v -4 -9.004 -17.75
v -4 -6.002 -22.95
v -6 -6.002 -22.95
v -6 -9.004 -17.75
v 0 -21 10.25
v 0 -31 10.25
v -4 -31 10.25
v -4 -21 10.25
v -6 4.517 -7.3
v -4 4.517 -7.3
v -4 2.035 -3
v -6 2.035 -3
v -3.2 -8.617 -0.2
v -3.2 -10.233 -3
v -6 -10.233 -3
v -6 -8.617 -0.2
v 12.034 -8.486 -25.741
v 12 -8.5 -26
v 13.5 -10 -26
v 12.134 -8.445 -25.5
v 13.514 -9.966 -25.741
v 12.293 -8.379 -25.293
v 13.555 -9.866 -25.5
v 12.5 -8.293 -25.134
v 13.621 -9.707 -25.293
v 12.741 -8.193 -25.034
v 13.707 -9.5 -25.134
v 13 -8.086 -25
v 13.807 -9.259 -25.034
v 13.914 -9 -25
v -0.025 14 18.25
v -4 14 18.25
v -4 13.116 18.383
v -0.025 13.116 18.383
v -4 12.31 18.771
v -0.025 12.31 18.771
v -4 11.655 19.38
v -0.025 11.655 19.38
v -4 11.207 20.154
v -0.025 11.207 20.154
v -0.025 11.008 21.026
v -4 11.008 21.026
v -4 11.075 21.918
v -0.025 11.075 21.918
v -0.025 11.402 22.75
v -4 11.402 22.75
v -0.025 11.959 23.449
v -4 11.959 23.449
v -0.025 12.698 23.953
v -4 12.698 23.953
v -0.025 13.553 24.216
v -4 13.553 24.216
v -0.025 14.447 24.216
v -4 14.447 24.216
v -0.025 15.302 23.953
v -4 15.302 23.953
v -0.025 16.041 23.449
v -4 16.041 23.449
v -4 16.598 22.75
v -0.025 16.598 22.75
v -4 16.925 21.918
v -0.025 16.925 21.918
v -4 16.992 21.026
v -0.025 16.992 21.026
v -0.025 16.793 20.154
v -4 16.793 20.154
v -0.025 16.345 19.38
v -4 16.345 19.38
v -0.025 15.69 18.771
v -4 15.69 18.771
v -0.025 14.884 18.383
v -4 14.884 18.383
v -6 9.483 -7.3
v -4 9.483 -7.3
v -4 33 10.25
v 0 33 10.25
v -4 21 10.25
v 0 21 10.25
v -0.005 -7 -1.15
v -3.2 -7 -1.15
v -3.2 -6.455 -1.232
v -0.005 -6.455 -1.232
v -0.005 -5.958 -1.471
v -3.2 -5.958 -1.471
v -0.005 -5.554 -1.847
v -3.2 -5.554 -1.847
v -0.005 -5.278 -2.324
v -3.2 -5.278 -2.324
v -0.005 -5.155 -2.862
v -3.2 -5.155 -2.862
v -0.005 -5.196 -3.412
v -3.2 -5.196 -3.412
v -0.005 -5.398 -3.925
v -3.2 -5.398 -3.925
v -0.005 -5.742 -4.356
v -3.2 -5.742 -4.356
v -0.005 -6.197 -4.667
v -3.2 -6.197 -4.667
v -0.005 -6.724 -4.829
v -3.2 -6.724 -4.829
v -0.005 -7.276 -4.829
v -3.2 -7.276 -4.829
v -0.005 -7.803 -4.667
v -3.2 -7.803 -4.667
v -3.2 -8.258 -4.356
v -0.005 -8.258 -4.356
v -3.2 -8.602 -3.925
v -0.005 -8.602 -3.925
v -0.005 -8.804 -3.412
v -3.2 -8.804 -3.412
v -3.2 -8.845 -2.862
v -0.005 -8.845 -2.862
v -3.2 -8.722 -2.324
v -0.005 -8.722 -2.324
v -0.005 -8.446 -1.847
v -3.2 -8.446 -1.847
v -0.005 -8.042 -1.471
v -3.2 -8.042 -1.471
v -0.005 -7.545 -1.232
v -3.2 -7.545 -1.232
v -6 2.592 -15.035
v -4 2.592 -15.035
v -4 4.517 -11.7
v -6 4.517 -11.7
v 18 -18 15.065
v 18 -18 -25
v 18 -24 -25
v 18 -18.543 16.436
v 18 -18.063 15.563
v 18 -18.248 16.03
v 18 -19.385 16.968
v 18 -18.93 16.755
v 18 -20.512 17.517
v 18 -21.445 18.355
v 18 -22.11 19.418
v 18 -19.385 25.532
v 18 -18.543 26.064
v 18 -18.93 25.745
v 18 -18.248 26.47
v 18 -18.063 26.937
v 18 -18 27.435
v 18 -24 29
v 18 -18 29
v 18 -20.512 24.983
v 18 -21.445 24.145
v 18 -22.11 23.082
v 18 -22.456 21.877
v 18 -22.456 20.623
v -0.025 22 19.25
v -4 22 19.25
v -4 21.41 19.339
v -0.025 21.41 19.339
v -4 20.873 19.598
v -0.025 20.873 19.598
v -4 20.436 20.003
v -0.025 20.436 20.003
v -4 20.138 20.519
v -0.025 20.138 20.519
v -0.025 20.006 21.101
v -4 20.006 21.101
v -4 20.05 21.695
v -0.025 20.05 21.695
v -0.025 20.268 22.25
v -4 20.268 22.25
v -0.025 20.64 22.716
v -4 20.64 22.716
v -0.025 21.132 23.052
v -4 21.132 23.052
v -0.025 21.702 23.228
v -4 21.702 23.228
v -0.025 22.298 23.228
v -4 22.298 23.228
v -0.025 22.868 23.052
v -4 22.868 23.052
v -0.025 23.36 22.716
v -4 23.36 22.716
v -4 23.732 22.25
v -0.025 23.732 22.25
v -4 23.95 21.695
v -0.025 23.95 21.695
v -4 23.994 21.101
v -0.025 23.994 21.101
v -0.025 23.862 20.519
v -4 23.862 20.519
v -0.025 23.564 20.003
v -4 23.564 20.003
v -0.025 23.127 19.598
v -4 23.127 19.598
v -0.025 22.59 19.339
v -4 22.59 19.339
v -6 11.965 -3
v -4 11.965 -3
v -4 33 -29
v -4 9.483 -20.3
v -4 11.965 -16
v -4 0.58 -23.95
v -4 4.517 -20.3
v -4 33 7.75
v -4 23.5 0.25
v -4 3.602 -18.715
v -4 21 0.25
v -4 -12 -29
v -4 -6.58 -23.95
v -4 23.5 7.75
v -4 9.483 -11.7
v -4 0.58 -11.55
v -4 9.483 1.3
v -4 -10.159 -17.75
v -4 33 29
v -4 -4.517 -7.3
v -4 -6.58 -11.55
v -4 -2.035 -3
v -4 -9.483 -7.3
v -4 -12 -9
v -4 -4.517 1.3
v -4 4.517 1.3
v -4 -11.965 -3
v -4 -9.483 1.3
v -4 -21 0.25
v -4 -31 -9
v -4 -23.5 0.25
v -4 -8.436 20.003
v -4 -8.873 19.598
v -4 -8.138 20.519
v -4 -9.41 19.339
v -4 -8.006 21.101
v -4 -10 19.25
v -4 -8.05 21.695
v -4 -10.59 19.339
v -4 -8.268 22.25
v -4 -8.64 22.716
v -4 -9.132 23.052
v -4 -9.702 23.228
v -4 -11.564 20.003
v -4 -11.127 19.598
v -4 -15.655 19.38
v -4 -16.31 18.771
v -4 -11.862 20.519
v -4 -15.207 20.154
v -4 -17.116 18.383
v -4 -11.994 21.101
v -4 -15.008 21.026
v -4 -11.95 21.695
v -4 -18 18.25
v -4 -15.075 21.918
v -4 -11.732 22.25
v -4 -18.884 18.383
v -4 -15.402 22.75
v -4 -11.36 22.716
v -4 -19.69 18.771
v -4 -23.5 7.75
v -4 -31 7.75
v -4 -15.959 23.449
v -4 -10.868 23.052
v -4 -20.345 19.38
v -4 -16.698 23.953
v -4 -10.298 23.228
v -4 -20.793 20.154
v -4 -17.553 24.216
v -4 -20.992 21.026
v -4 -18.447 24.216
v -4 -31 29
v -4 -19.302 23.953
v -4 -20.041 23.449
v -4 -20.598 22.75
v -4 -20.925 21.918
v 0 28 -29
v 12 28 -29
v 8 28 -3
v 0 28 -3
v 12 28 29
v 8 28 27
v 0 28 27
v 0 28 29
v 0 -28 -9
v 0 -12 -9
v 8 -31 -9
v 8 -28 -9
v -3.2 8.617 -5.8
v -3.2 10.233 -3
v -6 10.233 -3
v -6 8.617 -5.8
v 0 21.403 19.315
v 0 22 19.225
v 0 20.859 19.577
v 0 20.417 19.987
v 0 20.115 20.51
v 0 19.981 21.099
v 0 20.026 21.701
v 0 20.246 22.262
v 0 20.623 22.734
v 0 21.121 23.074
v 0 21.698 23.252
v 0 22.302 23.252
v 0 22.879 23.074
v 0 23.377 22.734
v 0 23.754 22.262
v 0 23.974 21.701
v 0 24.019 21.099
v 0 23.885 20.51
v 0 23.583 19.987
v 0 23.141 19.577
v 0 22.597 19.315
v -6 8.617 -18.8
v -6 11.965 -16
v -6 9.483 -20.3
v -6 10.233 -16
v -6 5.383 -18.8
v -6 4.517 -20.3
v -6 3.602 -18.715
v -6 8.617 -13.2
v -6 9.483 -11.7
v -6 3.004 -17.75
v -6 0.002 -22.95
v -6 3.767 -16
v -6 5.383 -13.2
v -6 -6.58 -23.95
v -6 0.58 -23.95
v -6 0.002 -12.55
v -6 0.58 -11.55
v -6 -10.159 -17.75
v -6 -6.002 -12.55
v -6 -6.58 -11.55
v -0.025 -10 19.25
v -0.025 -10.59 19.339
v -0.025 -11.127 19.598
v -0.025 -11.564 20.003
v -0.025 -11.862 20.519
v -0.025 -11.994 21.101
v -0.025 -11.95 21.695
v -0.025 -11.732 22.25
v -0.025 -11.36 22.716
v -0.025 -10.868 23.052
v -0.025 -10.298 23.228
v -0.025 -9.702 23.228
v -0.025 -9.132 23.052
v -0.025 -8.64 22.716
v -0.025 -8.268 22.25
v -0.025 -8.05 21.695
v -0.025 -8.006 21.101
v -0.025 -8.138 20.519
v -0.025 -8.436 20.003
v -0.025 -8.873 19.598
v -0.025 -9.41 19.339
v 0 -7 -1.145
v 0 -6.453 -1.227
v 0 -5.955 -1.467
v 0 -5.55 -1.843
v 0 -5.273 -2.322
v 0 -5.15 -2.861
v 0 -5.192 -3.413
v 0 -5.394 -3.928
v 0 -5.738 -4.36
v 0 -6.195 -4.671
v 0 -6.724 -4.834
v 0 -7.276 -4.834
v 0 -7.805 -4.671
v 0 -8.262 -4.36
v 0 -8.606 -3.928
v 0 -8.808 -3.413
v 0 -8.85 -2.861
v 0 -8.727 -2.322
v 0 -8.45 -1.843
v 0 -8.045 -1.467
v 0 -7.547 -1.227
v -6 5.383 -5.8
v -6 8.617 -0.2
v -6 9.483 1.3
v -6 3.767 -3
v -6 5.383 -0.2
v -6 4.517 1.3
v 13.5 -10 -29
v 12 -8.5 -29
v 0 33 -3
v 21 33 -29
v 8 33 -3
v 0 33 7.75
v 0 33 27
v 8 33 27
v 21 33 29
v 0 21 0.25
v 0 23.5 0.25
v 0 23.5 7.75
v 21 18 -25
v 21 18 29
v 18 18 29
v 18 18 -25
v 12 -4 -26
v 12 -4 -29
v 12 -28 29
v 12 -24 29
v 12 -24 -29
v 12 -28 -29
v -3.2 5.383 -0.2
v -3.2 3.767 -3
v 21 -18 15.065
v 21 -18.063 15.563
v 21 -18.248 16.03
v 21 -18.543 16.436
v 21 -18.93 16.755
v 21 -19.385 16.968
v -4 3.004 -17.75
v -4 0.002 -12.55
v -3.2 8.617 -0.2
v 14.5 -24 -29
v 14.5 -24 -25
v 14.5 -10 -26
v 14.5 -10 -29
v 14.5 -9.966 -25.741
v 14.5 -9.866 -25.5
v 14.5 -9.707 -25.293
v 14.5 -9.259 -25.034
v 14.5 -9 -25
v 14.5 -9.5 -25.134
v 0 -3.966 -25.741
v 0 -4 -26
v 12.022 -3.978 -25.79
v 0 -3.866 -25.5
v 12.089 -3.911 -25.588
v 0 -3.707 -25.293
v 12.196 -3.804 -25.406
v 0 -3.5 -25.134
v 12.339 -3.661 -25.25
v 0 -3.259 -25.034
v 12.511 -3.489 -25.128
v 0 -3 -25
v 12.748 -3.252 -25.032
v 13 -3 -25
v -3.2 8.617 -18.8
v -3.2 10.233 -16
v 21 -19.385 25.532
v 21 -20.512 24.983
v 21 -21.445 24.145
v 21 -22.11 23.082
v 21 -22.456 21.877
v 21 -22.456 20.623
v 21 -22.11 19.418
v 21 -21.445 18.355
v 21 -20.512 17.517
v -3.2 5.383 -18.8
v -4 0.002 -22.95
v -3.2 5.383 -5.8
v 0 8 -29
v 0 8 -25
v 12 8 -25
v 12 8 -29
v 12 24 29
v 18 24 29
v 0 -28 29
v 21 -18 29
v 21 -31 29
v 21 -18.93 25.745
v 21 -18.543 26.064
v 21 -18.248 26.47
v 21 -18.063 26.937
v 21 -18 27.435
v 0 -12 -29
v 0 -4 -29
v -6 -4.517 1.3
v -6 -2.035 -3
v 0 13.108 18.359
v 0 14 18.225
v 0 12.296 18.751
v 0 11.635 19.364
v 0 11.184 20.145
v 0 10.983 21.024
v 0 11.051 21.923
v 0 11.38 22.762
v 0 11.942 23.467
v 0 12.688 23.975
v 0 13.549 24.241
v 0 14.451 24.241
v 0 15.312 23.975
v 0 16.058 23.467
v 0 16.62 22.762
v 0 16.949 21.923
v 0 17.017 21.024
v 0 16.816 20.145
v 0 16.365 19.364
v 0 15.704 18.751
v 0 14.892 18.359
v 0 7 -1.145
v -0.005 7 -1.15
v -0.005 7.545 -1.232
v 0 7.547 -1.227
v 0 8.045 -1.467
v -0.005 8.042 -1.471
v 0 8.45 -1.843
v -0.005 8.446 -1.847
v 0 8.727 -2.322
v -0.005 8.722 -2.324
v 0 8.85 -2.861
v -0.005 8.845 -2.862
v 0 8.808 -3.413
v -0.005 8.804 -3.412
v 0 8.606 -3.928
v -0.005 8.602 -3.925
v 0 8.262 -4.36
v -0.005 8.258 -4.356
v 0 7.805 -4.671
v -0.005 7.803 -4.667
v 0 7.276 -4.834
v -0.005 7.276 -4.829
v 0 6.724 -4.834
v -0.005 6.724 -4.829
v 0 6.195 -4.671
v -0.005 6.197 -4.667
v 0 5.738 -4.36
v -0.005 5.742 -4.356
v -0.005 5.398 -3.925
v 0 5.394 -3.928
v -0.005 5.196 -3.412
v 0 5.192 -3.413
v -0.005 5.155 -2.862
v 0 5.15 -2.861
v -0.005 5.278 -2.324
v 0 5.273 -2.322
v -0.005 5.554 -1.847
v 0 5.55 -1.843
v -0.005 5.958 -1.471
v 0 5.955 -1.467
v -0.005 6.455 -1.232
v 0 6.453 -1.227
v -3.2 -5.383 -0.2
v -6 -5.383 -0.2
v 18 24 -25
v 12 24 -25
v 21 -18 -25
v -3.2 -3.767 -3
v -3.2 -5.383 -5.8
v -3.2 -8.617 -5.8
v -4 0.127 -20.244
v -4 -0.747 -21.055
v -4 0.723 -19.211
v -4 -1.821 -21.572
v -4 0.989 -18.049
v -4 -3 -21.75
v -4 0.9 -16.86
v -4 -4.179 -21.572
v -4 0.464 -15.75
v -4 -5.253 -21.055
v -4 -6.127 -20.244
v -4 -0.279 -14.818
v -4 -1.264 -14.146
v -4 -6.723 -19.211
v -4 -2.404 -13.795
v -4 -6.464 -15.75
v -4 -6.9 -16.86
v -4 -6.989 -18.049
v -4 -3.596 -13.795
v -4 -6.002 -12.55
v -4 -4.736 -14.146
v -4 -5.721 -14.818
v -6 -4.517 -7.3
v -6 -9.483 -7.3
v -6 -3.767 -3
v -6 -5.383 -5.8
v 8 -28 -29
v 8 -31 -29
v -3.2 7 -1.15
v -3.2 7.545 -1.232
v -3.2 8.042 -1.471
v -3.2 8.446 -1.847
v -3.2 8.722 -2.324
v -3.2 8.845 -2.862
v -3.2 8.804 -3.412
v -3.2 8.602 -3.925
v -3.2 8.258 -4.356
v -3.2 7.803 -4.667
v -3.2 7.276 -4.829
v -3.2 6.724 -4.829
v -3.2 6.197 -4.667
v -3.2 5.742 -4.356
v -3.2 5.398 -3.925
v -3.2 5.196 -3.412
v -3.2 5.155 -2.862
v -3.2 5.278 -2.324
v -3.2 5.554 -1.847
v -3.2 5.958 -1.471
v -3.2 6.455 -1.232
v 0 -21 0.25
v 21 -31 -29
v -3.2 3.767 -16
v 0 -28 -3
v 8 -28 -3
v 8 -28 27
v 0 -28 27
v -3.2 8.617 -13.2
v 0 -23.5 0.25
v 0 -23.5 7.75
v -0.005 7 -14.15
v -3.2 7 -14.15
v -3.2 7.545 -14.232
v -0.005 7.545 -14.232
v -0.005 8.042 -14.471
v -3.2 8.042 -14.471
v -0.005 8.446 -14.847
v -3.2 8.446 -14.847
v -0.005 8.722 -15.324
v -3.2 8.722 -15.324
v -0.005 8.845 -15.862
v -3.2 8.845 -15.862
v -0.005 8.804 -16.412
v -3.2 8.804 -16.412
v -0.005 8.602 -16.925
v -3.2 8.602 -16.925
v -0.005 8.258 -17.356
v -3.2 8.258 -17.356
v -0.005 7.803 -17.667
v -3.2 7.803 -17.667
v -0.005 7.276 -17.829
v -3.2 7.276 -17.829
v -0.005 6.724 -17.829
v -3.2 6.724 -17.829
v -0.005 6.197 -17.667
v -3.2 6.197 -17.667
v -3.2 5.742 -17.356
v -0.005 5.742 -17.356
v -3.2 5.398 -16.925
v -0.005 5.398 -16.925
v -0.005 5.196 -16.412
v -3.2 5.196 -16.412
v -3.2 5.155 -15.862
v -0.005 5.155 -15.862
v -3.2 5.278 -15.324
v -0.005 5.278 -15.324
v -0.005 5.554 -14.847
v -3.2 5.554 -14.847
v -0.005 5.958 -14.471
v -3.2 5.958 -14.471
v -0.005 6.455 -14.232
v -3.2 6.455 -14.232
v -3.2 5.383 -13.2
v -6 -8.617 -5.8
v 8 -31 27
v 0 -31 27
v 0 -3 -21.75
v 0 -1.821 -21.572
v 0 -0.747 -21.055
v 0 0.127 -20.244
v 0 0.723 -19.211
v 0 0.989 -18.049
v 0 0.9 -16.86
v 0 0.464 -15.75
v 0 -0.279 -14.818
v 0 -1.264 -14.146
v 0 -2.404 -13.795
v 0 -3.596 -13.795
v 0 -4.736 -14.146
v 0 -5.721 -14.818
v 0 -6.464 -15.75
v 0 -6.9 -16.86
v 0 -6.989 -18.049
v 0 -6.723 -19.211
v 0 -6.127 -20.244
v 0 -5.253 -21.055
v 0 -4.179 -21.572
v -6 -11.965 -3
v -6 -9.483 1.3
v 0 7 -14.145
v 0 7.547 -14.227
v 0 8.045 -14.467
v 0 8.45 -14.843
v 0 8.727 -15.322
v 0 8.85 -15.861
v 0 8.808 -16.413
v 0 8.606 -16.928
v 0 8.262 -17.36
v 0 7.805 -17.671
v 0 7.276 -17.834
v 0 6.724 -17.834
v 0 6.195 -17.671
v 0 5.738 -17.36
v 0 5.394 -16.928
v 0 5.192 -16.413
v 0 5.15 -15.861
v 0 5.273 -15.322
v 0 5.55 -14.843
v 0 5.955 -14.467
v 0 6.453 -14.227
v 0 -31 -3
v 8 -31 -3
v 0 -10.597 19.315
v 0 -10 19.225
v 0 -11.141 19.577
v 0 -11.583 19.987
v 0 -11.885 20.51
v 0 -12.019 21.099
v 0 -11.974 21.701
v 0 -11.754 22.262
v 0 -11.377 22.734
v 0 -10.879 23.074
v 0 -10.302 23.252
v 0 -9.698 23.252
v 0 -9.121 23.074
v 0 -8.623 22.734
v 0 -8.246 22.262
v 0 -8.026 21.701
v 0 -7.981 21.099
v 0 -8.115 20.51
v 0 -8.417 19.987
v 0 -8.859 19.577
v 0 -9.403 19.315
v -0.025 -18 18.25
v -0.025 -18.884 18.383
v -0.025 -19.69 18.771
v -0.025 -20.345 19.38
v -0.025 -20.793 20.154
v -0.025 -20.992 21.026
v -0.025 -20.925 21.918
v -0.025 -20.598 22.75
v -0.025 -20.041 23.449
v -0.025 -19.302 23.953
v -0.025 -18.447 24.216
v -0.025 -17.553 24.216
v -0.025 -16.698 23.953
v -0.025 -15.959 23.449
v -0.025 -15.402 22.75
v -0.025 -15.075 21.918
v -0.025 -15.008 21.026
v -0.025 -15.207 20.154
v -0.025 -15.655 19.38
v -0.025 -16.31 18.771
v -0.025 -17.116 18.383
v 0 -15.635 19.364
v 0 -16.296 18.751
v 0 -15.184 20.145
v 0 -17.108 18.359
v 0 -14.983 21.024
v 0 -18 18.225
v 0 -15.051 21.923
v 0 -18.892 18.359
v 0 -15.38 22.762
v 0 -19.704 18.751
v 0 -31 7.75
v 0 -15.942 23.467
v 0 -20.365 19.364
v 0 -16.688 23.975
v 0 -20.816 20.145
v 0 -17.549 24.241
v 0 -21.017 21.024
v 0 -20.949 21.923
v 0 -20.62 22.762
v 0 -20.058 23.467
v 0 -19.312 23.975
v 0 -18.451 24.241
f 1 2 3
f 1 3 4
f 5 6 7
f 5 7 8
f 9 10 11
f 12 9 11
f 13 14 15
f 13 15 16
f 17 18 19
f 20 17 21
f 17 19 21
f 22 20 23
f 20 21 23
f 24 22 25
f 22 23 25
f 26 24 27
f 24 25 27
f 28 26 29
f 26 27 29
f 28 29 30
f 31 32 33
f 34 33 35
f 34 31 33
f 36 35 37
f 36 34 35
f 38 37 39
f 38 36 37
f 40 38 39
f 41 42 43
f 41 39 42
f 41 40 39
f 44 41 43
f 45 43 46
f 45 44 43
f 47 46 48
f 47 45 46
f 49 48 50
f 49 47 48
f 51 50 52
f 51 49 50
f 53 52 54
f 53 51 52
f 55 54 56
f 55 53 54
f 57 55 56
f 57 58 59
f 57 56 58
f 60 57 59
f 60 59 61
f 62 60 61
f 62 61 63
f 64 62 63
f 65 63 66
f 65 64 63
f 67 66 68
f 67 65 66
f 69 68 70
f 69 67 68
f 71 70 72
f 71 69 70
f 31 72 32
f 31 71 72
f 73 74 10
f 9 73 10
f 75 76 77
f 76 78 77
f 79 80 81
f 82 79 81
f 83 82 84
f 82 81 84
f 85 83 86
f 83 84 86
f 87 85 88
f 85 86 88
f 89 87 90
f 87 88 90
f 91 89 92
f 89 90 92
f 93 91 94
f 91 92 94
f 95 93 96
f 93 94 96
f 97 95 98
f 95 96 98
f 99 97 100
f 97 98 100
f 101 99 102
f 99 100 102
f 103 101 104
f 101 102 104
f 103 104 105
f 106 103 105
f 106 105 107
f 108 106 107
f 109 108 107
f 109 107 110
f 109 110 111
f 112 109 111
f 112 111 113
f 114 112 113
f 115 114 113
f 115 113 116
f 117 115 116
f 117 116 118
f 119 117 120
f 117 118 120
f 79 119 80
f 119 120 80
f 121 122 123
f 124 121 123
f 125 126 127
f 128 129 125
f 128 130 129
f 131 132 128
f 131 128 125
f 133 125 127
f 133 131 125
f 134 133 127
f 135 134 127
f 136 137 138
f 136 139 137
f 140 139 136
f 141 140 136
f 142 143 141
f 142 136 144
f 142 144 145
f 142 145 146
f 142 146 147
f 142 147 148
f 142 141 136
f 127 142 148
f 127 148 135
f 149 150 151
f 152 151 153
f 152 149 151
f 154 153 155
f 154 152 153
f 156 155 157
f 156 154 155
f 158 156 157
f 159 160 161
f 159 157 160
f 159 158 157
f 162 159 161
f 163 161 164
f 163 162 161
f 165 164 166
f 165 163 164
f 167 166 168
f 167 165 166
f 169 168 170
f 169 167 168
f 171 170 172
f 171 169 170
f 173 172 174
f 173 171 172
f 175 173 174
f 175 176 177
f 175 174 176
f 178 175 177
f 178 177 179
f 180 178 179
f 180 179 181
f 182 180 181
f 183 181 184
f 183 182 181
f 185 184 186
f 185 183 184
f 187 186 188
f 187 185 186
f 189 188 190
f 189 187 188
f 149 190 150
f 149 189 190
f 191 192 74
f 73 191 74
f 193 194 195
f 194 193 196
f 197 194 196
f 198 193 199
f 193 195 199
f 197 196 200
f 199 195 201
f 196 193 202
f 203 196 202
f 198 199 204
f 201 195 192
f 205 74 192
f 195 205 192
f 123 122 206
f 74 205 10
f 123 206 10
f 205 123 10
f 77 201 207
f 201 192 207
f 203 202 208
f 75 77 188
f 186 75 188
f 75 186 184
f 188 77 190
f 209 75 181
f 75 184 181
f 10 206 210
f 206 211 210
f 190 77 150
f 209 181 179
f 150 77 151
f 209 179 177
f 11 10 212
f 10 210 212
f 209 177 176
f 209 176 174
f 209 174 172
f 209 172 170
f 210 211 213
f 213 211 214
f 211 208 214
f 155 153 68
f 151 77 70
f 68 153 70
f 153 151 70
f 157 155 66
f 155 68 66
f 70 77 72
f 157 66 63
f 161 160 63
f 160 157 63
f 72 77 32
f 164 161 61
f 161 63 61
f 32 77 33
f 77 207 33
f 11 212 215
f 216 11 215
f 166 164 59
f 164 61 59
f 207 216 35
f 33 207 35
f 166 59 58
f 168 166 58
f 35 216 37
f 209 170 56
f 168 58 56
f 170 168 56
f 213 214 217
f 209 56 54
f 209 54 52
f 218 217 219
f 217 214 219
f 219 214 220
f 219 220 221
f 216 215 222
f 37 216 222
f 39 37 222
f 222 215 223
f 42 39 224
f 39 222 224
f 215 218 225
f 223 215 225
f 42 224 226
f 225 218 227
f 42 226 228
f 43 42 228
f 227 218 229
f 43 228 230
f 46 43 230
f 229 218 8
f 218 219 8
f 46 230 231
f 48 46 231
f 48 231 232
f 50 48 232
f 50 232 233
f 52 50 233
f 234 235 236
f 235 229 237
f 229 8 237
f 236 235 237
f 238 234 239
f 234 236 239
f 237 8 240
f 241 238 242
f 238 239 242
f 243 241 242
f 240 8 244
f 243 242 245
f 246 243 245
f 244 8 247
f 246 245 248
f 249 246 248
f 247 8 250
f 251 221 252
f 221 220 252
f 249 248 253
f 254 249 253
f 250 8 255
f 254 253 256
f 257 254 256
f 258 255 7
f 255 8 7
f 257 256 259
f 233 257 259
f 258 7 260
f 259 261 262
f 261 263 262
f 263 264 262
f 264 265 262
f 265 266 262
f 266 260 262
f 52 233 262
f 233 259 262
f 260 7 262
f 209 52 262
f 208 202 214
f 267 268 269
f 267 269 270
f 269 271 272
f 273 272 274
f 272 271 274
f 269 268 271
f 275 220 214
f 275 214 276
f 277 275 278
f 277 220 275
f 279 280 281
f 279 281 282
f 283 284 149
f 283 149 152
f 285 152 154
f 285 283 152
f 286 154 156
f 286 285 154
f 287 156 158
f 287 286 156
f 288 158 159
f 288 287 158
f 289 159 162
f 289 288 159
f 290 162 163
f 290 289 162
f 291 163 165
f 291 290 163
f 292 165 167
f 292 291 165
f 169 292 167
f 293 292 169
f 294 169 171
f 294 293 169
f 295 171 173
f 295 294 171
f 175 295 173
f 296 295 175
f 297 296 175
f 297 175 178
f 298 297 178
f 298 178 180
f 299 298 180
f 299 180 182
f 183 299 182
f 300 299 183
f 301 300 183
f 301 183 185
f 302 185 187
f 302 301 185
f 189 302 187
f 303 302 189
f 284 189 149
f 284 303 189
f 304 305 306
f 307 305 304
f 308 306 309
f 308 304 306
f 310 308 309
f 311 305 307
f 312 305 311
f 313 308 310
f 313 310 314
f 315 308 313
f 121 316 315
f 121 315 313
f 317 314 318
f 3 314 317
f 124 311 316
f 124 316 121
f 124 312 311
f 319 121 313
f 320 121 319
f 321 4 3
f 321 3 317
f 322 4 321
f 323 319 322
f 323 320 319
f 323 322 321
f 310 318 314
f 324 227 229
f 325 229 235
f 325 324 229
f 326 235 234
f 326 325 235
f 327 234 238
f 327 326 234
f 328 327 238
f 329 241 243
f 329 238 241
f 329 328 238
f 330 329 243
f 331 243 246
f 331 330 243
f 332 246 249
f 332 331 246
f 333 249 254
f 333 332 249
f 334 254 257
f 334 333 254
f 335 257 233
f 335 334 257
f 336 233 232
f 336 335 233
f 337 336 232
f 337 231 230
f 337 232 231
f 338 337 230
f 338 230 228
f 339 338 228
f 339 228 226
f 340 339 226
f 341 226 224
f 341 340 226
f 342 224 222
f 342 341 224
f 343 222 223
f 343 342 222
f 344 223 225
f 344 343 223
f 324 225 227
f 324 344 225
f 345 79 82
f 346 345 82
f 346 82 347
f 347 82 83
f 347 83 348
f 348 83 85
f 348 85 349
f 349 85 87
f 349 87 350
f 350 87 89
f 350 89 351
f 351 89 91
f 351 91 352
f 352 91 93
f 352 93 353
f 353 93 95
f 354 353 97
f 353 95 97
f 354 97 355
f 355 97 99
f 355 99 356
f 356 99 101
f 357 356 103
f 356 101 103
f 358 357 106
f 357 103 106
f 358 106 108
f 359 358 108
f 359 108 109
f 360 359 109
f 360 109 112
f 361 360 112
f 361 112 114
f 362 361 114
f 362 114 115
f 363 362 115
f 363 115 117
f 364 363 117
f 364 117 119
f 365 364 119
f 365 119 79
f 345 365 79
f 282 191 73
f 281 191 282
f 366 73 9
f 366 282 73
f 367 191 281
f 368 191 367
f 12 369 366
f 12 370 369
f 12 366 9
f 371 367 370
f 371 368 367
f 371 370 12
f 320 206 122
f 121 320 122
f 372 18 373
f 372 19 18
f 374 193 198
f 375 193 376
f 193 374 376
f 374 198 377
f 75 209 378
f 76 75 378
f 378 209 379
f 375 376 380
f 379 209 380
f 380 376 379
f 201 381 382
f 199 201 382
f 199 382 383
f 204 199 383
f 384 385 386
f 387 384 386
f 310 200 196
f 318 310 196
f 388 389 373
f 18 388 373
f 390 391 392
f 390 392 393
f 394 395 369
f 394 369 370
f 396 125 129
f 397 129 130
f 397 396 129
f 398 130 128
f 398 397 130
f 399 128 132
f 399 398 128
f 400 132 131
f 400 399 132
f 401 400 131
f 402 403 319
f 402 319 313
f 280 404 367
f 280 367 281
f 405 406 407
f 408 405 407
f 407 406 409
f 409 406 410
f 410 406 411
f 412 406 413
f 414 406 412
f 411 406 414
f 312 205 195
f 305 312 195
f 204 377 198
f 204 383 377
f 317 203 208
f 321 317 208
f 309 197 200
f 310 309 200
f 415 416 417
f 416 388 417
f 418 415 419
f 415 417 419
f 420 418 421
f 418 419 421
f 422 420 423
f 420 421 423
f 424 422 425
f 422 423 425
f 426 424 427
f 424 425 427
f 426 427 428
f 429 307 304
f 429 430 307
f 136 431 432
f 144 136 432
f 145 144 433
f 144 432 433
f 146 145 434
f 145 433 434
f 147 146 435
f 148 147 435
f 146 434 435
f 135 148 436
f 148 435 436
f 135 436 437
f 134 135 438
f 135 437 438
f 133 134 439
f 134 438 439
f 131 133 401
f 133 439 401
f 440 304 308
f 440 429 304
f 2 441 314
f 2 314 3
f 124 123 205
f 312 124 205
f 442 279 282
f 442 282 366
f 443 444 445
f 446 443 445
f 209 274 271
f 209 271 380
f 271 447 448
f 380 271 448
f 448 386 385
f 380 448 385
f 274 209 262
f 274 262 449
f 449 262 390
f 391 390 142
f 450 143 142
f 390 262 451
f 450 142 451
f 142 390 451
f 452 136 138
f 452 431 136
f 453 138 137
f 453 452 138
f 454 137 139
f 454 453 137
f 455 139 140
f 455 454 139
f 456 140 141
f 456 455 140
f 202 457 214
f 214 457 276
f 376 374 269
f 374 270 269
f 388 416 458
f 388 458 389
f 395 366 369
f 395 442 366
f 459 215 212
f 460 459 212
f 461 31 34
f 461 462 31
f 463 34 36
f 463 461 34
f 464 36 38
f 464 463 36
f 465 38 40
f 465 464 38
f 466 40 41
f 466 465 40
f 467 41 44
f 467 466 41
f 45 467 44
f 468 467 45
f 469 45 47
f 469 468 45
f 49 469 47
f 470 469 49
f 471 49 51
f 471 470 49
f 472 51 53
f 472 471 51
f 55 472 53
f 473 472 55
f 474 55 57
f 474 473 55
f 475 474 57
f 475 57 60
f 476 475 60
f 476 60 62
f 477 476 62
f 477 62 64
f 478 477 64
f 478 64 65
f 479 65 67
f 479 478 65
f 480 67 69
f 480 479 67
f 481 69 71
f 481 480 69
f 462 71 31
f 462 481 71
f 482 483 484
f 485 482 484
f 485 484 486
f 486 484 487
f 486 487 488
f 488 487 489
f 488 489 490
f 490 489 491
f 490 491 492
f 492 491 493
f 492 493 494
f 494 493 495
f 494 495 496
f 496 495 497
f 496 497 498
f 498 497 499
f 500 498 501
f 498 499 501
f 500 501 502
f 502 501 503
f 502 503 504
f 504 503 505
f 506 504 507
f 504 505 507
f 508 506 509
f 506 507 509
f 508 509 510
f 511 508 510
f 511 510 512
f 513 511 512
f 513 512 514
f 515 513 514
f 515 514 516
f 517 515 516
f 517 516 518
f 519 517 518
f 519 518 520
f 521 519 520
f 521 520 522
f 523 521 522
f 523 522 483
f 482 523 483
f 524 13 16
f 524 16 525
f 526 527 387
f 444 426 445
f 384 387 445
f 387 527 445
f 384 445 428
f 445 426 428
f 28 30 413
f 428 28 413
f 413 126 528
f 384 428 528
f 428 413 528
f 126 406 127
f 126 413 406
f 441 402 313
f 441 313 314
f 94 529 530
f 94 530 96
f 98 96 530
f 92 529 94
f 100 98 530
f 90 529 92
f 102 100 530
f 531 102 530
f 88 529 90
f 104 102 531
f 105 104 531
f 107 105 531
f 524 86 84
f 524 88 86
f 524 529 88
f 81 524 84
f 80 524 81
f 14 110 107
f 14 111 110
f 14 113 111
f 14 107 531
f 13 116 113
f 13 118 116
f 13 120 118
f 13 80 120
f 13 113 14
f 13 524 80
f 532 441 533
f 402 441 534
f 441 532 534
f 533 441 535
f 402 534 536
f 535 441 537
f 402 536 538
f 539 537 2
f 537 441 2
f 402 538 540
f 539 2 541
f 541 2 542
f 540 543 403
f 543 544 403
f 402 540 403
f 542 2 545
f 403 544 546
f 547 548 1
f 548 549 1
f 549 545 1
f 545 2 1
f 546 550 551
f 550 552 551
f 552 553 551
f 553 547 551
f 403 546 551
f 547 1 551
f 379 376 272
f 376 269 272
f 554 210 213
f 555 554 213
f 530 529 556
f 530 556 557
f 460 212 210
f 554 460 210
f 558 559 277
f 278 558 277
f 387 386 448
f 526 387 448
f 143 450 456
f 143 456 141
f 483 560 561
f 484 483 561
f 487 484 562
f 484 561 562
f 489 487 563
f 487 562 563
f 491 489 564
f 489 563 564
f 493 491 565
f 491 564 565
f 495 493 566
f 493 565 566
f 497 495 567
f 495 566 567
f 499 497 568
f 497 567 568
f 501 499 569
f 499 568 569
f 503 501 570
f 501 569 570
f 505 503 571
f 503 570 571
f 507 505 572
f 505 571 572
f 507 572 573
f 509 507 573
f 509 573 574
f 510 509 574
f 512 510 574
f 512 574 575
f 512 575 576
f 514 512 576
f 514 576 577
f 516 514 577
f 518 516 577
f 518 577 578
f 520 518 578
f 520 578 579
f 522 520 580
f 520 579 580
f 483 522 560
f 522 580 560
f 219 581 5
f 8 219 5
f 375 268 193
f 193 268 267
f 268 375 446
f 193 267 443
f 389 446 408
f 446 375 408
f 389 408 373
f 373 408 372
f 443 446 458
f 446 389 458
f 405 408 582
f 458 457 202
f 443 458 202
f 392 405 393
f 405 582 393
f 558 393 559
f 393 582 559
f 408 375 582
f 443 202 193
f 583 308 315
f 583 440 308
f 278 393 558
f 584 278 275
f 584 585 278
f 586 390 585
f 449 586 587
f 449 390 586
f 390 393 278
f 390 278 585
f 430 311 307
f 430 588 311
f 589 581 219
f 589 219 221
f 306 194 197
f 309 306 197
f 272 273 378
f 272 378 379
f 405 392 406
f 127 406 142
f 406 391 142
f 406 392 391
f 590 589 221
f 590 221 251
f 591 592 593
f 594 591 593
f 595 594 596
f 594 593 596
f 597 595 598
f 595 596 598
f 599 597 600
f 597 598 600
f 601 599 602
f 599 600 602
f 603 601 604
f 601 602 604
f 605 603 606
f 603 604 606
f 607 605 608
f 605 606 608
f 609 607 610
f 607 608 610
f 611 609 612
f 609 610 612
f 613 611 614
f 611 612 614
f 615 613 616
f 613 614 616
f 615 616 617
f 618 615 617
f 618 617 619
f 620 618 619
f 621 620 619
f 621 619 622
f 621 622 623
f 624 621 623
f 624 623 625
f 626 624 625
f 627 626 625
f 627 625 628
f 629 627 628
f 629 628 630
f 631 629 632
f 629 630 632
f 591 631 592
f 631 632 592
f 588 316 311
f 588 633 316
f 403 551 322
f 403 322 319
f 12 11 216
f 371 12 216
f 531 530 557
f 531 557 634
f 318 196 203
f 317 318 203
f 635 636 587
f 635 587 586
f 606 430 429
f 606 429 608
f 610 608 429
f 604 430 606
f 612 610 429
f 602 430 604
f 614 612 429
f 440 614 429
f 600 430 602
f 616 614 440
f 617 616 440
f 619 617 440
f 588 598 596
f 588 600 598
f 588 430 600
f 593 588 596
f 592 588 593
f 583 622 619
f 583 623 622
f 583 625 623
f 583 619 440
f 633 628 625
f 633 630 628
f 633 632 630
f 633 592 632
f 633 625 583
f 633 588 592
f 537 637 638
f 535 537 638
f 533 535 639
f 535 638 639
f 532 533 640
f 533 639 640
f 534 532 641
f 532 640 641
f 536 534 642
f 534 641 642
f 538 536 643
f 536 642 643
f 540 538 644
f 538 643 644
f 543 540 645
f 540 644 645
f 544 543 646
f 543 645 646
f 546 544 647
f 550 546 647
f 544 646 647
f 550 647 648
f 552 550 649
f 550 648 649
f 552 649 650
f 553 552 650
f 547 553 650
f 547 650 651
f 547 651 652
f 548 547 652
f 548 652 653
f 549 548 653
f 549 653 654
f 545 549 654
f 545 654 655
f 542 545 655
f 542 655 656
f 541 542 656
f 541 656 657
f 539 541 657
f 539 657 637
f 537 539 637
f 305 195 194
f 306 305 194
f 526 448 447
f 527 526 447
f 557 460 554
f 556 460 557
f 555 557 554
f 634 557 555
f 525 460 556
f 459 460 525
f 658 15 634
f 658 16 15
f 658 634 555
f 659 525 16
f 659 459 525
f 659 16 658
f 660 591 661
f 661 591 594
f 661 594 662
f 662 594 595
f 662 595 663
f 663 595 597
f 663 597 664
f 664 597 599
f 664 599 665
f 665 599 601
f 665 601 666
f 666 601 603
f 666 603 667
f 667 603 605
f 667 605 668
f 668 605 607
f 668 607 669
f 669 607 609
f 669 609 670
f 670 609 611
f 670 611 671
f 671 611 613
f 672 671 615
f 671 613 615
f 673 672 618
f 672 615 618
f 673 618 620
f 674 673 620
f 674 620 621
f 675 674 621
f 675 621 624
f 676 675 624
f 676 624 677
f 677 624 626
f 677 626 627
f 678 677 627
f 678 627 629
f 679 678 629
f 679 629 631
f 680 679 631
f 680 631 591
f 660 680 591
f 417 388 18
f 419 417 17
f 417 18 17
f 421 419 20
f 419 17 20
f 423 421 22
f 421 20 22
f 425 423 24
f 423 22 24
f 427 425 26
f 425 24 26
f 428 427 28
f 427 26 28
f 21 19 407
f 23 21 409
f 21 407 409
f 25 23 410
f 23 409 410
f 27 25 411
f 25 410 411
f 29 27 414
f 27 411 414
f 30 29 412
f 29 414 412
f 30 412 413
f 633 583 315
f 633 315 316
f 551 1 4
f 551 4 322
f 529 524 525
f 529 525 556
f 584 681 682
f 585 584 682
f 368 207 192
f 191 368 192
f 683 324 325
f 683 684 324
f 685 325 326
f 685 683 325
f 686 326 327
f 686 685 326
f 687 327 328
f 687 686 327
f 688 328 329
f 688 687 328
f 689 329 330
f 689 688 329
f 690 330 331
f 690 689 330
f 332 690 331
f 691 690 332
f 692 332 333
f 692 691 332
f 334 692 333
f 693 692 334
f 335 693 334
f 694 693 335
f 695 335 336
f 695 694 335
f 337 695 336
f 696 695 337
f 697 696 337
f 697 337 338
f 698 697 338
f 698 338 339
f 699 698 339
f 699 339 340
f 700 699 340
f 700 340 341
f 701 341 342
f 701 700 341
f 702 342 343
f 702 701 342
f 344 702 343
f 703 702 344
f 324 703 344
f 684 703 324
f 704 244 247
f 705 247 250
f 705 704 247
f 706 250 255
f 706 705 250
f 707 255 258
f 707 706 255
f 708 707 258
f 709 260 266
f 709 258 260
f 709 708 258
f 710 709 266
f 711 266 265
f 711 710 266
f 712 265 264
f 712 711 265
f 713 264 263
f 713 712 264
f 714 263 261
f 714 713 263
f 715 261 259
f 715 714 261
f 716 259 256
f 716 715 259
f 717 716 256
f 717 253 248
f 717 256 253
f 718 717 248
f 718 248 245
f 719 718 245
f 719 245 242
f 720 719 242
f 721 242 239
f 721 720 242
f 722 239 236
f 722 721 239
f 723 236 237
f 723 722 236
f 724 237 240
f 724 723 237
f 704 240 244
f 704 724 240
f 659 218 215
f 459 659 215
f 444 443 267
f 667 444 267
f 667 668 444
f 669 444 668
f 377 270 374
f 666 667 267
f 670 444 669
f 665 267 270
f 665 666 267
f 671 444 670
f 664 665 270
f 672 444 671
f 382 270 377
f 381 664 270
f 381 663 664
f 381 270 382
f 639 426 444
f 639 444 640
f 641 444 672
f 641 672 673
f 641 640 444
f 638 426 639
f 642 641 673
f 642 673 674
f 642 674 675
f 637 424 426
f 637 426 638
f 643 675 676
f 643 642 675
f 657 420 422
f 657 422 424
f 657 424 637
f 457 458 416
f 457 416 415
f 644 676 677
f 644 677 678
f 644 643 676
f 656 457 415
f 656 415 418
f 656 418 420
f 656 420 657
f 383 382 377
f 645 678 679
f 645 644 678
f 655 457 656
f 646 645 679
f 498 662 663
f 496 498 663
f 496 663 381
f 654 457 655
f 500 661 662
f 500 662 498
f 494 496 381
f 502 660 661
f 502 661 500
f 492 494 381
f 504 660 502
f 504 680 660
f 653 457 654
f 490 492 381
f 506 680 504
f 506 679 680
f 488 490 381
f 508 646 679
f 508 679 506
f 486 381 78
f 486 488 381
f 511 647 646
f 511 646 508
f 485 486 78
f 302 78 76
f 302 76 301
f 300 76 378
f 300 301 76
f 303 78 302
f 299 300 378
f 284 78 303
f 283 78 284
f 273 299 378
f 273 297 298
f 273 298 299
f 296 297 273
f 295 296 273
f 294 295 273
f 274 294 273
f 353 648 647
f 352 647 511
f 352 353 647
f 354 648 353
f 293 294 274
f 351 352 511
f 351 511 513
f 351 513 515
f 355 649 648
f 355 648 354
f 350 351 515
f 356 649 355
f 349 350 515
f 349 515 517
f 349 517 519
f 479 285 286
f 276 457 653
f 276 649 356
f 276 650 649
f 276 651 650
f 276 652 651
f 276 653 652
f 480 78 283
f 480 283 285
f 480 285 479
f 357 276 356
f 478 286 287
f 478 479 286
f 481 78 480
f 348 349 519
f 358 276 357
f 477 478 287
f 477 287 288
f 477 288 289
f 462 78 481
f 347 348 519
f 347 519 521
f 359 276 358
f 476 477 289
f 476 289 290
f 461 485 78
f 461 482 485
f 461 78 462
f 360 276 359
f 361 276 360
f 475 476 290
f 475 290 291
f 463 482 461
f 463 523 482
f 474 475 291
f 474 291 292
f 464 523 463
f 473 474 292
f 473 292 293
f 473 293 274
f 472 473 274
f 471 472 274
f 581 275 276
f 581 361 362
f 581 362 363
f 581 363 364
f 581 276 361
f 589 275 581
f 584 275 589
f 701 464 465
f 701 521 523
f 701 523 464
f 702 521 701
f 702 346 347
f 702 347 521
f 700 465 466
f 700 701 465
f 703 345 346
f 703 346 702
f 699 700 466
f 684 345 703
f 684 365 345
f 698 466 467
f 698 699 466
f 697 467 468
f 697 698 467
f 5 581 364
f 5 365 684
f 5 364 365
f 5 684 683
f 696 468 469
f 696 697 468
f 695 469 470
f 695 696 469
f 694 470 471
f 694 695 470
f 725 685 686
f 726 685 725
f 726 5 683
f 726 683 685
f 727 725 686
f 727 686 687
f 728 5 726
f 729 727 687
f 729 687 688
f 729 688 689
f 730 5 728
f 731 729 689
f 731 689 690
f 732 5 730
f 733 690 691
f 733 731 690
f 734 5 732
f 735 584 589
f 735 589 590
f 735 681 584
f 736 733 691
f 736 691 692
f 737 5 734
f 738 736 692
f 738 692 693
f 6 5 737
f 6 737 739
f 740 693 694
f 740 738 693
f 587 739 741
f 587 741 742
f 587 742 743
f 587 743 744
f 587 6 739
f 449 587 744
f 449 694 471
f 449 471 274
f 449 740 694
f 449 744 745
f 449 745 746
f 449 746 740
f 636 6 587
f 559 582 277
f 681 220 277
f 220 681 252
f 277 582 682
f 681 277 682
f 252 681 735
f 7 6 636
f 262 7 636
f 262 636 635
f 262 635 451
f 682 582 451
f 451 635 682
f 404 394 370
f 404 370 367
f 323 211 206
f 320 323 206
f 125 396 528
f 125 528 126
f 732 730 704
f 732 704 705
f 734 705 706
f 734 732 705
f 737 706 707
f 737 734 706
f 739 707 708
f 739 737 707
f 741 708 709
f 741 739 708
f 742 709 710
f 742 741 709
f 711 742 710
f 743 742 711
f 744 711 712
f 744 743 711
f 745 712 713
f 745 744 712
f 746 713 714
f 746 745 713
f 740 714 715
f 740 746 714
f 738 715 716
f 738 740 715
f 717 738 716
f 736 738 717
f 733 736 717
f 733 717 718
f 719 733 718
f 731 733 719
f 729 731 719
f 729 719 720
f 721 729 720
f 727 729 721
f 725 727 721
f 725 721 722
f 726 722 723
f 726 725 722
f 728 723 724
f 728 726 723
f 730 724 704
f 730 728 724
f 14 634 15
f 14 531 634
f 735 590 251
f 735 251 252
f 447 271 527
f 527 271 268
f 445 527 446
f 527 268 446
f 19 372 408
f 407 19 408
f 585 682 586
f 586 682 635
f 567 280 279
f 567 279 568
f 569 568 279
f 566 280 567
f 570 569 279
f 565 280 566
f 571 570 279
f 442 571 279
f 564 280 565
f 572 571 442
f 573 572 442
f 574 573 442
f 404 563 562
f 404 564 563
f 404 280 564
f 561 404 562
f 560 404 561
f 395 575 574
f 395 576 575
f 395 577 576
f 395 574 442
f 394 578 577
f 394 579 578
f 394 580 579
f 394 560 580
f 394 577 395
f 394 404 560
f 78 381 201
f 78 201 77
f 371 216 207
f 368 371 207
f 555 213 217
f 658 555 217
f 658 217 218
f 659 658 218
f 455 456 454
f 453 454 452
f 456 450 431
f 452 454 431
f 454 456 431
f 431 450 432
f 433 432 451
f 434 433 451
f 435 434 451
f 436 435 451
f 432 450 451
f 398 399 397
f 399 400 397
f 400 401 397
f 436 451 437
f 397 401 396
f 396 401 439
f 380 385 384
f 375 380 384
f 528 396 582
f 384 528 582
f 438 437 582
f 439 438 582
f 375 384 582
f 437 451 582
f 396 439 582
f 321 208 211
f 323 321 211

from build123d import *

# Parameters (mm, degrees)
SKETCH1_W                       = 62
SKETCH1_H                       = 58
BOSS_EXTRUDE1_DEPTH             = 4
BOSS_EXTRUDE2_DEPTH             = 58
F_4_0MM_DOWEL_HOLE1_D           = 3.7
F_4_0MM_DOWEL_HOLE1_DEPTH       = 30
F_4_0MM_DOWEL_HOLE1_CSINK_D     = 3.71
F_4_0MM_DOWEL_HOLE1_CSINK_ANGLE = 90
F_4_0MM_DOWEL_HOLE1_TIP         = 1.111592145
F_6_0MM_DOWEL_HOLE1_AT_2_COUNT  = 2
F_6_0MM_DOWEL_HOLE1_AT_2_PITCH  = 32
F_6_0MM_DOWEL_HOLE1_AT_3_COUNT  = 2
F_6_0MM_DOWEL_HOLE1_AT_3_PITCH  = 42.544094772
SKETCH9_W                       = 9
SKETCH9_H                       = 62
BOSS_EXTRUDE3_DEPTH             = 4
SKETCH11_W                      = 9
SKETCH11_H                      = 58
BOSS_EXTRUDE4_DEPTH             = 4
F_4_0MM_DOWEL_HOLE2_AT_2_COUNT  = 2
F_4_0MM_DOWEL_HOLE2_AT_2_PITCH  = 32
SKETCH17_W                      = 8
SKETCH17_H                      = 30
CUT_EXTRUDE1_DEPTH              = 10
SKETCH20_W                      = 16
SKETCH20_H                      = 20
CUT_EXTRUDE2_DEPTH              = 10
CUT_EXTRUDE3_DEPTH              = 10
SKETCH22_R                      = 4
CUT_EXTRUDE4_DEPTH              = 10
SKETCH23_W                      = 12
SKETCH23_H                      = 20
CUT_EXTRUDE5_DEPTH              = 10
SKETCH24_W                      = 2.5
SKETCH24_H                      = 14
CUT_EXTRUDE6_DEPTH              = 10
MOVE_FACE2_BY                   = 2
SKETCH25_W                      = 12
SKETCH25_H                      = 12
BOSS_EXTRUDE5_DEPTH             = 4
EXTRUDE_THIN1_DEPTH             = 2
CHAMFER1_SIZE                   = 1.5
FILLET3_R                       = 1
SKETCH28_R                      = 4.5
CUT_EXTRUDE7_DEPTH              = 10
FILLET4_R                       = 2
EXTRUDE_THIN2_DEPTH             = 2
CUT_EXTRUDE9_DEPTH              = 0.8


with BuildPart() as part:
    # Sketch1 → Boss-Extrude1 (new body)
    with BuildSketch(Plane.YZ):
        Rectangle(SKETCH1_W, SKETCH1_H)
    extrude(amount=-BOSS_EXTRUDE1_DEPTH)

    # Sketch3 → Boss-Extrude2 (add)
    with BuildSketch(Plane.XY.offset(29)):
        Polygon((0, 31), (21, 31), (21, 28), (21, 18), (18, 18), (18, 28), (0, 28), align=None)
        Polygon((0, -31), (21, -31), (21, -28), (21, -18), (18, -18), (18, -28), (0, -28), align=None)
    extrude(amount=-BOSS_EXTRUDE2_DEPTH)

    # Ø4.0mm Dowel Hole1
    with Locations(Plane(origin=(0, 0, 0), x_dir=(0, 0, -1), z_dir=(1, 0, 0))):
        with Locations((3, -7), (3, 7), (16, 7)):
            CounterSinkHole(F_4_0MM_DOWEL_HOLE1_D / 2, F_4_0MM_DOWEL_HOLE1_CSINK_D / 2, depth=F_4_0MM_DOWEL_HOLE1_DEPTH, counter_sink_angle=F_4_0MM_DOWEL_HOLE1_CSINK_ANGLE)
            with Locations((0, 0, -(F_4_0MM_DOWEL_HOLE1_DEPTH + F_4_0MM_DOWEL_HOLE1_TIP / 2))):  # 118° drill point
                Cone(0, F_4_0MM_DOWEL_HOLE1_D / 2, F_4_0MM_DOWEL_HOLE1_TIP, mode=Mode.SUBTRACT)

    # Sketch7 → Ø6.0mm Dowel Hole1 (revolve, cut)
    with BuildSketch(Plane(origin=(0, 14, 21.25), x_dir=(0, 0, -1), z_dir=(0, 1, 0))):
        Polygon((0, 0), (0, 31.802581857), (3, 30), (3, 0.025), (3.025, 0), align=None)
    f_6_0mm_dowel_hole1 = revolve(axis=Axis((6.35, 14, 21.25), (-1, 0, 0)), mode=Mode.SUBTRACT)

    # Ø6.0mm Dowel Hole1 at 2: Ø6.0mm Dowel Hole1 ×2
    with Locations(*[(0, -i * F_6_0MM_DOWEL_HOLE1_AT_2_PITCH, 0) for i in range(1, F_6_0MM_DOWEL_HOLE1_AT_2_COUNT)]):
        add(f_6_0mm_dowel_hole1, mode=Mode.SUBTRACT)

    # Ø6.0mm Dowel Hole1 at 3: Ø6.0mm Dowel Hole1 ×2
    with Locations(*[Vector(0, -0.39958542051392815, -0.9166959647084235) * (i * F_6_0MM_DOWEL_HOLE1_AT_3_PITCH) for i in range(1, F_6_0MM_DOWEL_HOLE1_AT_3_COUNT)]):
        add(f_6_0mm_dowel_hole1, mode=Mode.SUBTRACT)

    # Sketch9 → Boss-Extrude3 (add)
    with BuildSketch(Plane(origin=(0, 0, -29), x_dir=(1, 0, 0), z_dir=(0, 0, -1))):
        with Locations((16.5, 0)):
            Rectangle(SKETCH9_W, SKETCH9_H)
    extrude(amount=-BOSS_EXTRUDE3_DEPTH)

    # Sketch11 → Boss-Extrude4 (add)
    with BuildSketch(Plane(origin=(0, -28, 0), x_dir=(-1, 0, 0), z_dir=(0, 1, 0))):
        with Locations((-16.5, 0)):
            Rectangle(SKETCH11_W, SKETCH11_H)
    boss_extrude4 = extrude(amount=BOSS_EXTRUDE4_DEPTH)

    # Mirror1: Boss-Extrude4 across plane
    add(boss_extrude4.mirror(Plane.ZX))

    # Sketch14 → Ø4.0mm Dowel Hole2 (revolve, cut)
    with BuildSketch(Plane(origin=(0, -10, 21.25), x_dir=(0, 0, -1), z_dir=(0, 1, 0))):
        Polygon((0, 0), (0, 31.201721238), (2, 30), (2, 0.025), (2.025, 0), align=None)
    f_4_0mm_dowel_hole2 = revolve(axis=Axis((6.35, -10, 21.25), (-1, 0, 0)), mode=Mode.SUBTRACT)

    # Ø4.0mm Dowel Hole2 at 2: Ø4.0mm Dowel Hole2 ×2
    with Locations(*[(0, i * F_4_0MM_DOWEL_HOLE2_AT_2_PITCH, 0) for i in range(1, F_4_0MM_DOWEL_HOLE2_AT_2_COUNT)]):
        add(f_4_0mm_dowel_hole2, mode=Mode.SUBTRACT)

    # Sketch17 → Cut-Extrude1 (cut)
    with BuildSketch(Plane.XZ.offset(31)):
        with Locations((4, 12)):
            Rectangle(SKETCH17_W, SKETCH17_H)
    cut_extrude1 = extrude(amount=-CUT_EXTRUDE1_DEPTH, mode=Mode.SUBTRACT)

    # Sketch20 → Cut-Extrude2 (cut)
    with BuildSketch(Plane.YZ):
        with Locations((-20, -19)):
            Rectangle(SKETCH20_W, SKETCH20_H)
    extrude(amount=-CUT_EXTRUDE2_DEPTH, mode=Mode.SUBTRACT)

    # Sketch21 → Cut-Extrude3 (cut)
    with BuildSketch(Plane.YZ):
        Polygon((-31, 10.25), (-21, 10.25), (-21, 7.75), (-21, 0.25), (-23.5, 0.25), (-23.5, 7.75), (-31, 7.75), align=None)
    cut_extrude3 = extrude(amount=-CUT_EXTRUDE3_DEPTH, mode=Mode.SUBTRACT)

    # Mirror2: Cut-Extrude1, Cut-Extrude3 across plane
    add(cut_extrude1.mirror(Plane.ZX), mode=Mode.SUBTRACT)
    add(cut_extrude3.mirror(Plane.ZX), mode=Mode.SUBTRACT)

    # Sketch22 → Cut-Extrude4 (cut)
    with BuildSketch(Plane.YZ):
        with Locations(Location((-3, -17.75, 0), (0, 0, 270))):
            Circle(SKETCH22_R)
    extrude(amount=-CUT_EXTRUDE4_DEPTH, mode=Mode.SUBTRACT)

    # Sketch23 → Cut-Extrude5 (cut)
    with BuildSketch(Plane.XZ.offset(31)):
        with Locations((2, -19)):
            Rectangle(SKETCH23_W, SKETCH23_H)
    extrude(amount=-CUT_EXTRUDE5_DEPTH, mode=Mode.SUBTRACT)

    # Sketch24 → Cut-Extrude6 (cut)
    with BuildSketch(Plane.XY.offset(-25)):
        with Locations((13.25, -17)):
            Rectangle(SKETCH24_W, SKETCH24_H)
    extrude(amount=-CUT_EXTRUDE6_DEPTH, mode=Mode.SUBTRACT)

    # Move Face2: a face moved outward by 2.0
    extrude(part.faces().sort_by_distance((9.4875, 31, -2.475))[0], amount=MOVE_FACE2_BY, dir=(0, 1, 0))

    # Sketch25 → Boss-Extrude5 (add)
    with BuildSketch(Plane.XY.offset(-25)):
        with Locations((6, 2)):
            Rectangle(SKETCH25_W, SKETCH25_H)
    extrude(amount=-BOSS_EXTRUDE5_DEPTH)

    # Sketch26 → Extrude-Thin1 (add)
    with BuildSketch(Plane(origin=(-4, 0, 0), x_dir=(0, -1, 0), z_dir=(-1, 0, 0))):
        Polygon((6.579571669, -23.95), (10.159143338, -17.75), (6.579571669, -11.55), (-0.579571669, -11.55), (-4.159143338, -17.75), (-0.579571669, -23.95), align=None)
        Polygon((6.0022214, -22.95), (9.0044428, -17.75), (6.0022214, -12.55), (-0.0022214, -12.55), (-3.0044428, -17.75), (-0.0022214, -22.95), align=None, mode=Mode.SUBTRACT)
    extrude(amount=EXTRUDE_THIN1_DEPTH)

    # Chamfer1
    chamfer1_edges = [part.edges().sort_by_distance(p)[0] for p in [
        (12, -10, -27),
    ]]
    chamfer(chamfer1_edges, length=CHAMFER1_SIZE)

    # Fillet3
    fillet3_edges = [part.edges().sort_by_distance(p)[0] for p in [
        (14, -10, -25),
        (6, -4, -25),
        (12, -6.25, -25),
        (12.75, -9.25, -25),
    ]]
    fillet(fillet3_edges, radius=FILLET3_R)

    # Sketch28 → Cut-Extrude7 (cut)
    with BuildSketch(Plane.YZ.offset(21)):
        with Locations((-18, 21.25)):
            Circle(SKETCH28_R)
    extrude(amount=-CUT_EXTRUDE7_DEPTH, mode=Mode.SUBTRACT)

    # Fillet4
    fillet4_edges = [part.edges().sort_by_distance(p)[0] for p in [
        (19.5, -18, 25.75),
        (19.5, -18, 16.75),
    ]]
    fillet(fillet4_edges, radius=FILLET4_R)

    # Sketch29 → Extrude-Thin2 (add)
    # profile 1 of 3: a face of its own
    with BuildSketch(Plane(origin=(-4, 0, 0), x_dir=(0, -1, 0), z_dir=(-1, 0, 0))):
        Polygon((-4.517393842, -7.3), (-2.034787685, -3), (-4.517393842, 1.3), (-9.482606158, 1.3), (-11.965212315, -3), (-9.482606158, -7.3), align=None)
        Polygon((-5.383419246, -5.8), (-3.766838493, -3), (-5.383419246, -0.2), (-8.616580754, -0.2), (-10.233161507, -3), (-8.616580754, -5.8), align=None, mode=Mode.SUBTRACT)
    # profile 2 of 3: a face of its own
    with BuildSketch(Plane(origin=(-4, 0, 0), x_dir=(0, -1, 0), z_dir=(-1, 0, 0))):
        Polygon((9.482606158, -7.3), (11.965212315, -3), (9.482606158, 1.3), (4.517393842, 1.3), (2.034787685, -3), (4.517393842, -7.3), align=None)
        Polygon((8.616580754, -5.8), (10.233161507, -3), (8.616580754, -0.2), (5.383419246, -0.2), (3.766838493, -3), (5.383419246, -5.8), align=None, mode=Mode.SUBTRACT)
    # profile 3 of 3: a face of its own
    with BuildSketch(Plane(origin=(-4, 0, 0), x_dir=(0, -1, 0), z_dir=(-1, 0, 0))):
        Polygon((-4.517393842, -20.3), (-2.034787685, -16), (-4.517393842, -11.7), (-9.482606158, -11.7), (-11.965212315, -16), (-9.482606158, -20.3), align=None)
        Polygon((-5.383419246, -18.8), (-3.766838493, -16), (-5.383419246, -13.2), (-8.616580754, -13.2), (-10.233161507, -16), (-8.616580754, -18.8), align=None, mode=Mode.SUBTRACT)
    extrude(amount=EXTRUDE_THIN2_DEPTH)

    # Sketch30 → Cut-Extrude9 (cut)
    with BuildSketch(Plane(origin=(-4, 0, 0), x_dir=(0, -1, 0), z_dir=(-1, 0, 0))):
        Polygon((-8.616580754, -0.2), (-10.233161507, -3), (-8.616580754, -5.8), (-5.383419246, -5.8), (-3.766838493, -3), (-5.383419246, -0.2), align=None)
        Polygon((5.383419246, -0.2), (3.766838493, -3), (5.383419246, -5.8), (8.616580754, -5.8), (10.233161507, -3), (8.616580754, -0.2), align=None)
        Polygon((-10.233161507, -16), (-8.616580754, -18.8), (-5.383419246, -18.8), (-3.766838493, -16), (-5.383419246, -13.2), (-8.616580754, -13.2), align=None)
    extrude(amount=-CUT_EXTRUDE9_DEPTH, mode=Mode.SUBTRACT)


solid = part.part
